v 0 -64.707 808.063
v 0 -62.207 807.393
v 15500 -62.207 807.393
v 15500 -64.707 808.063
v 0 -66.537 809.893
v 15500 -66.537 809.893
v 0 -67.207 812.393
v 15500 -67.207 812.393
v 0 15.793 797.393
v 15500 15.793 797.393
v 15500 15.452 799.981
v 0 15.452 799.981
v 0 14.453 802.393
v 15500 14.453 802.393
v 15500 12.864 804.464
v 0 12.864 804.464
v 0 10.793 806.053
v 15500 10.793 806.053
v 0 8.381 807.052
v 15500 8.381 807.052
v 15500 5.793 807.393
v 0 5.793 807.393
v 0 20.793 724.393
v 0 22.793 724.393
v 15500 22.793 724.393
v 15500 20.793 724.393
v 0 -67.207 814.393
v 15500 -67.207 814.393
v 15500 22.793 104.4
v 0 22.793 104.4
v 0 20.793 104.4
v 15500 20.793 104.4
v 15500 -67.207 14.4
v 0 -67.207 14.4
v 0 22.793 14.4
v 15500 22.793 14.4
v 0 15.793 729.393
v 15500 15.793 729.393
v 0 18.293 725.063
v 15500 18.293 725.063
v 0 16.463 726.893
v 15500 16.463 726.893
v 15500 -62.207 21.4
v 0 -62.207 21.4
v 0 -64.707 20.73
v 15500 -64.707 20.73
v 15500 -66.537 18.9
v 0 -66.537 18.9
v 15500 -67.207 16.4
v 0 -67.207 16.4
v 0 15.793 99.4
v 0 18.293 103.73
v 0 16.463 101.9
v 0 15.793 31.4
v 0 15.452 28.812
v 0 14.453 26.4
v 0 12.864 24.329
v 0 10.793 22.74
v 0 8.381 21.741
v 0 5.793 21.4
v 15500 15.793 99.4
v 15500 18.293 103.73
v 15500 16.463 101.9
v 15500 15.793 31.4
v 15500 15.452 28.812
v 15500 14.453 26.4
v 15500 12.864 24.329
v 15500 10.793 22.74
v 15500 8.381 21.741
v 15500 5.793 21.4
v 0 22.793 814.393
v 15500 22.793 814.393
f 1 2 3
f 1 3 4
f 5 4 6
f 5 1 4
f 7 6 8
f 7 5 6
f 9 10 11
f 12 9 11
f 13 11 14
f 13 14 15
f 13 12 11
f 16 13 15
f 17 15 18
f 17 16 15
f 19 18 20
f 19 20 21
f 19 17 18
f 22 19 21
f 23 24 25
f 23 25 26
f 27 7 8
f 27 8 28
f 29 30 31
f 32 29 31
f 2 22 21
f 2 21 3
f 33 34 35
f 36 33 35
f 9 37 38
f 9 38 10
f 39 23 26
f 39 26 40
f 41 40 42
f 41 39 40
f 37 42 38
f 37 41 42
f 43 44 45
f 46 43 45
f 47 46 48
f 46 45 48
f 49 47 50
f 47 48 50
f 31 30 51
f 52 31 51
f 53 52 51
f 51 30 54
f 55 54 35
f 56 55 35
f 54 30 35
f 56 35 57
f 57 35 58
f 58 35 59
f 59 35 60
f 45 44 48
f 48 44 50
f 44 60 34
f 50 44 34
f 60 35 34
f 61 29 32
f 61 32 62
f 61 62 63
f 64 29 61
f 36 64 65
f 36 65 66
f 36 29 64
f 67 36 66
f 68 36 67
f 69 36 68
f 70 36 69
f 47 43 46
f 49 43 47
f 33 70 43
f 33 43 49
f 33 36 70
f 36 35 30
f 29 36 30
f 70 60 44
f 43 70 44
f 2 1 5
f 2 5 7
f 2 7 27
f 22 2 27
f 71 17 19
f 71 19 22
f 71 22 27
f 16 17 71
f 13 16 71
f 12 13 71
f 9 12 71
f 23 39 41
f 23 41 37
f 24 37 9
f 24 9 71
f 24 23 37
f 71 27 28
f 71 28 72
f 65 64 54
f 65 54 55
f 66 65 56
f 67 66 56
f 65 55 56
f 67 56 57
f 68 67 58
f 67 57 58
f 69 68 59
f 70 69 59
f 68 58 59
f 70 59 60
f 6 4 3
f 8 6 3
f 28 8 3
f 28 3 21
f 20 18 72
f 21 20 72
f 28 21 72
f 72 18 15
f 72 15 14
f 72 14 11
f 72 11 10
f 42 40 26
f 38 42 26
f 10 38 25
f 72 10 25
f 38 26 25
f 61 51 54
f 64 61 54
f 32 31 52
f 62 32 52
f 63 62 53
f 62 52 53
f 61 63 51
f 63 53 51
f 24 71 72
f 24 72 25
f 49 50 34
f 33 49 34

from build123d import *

# Parameters (mm, degrees)
EXTRUDE017_DEPTH = 15500
EXTRUDE018_DEPTH = 15500


with BuildPart() as extrude017:
    # AngleSteel004 → Extrude017 (new body)
    with BuildSketch(Plane(origin=(0, 53.415282, 39.015282), x_dir=(0, 1, 0), z_dir=(-1, 0, 0))):
        with BuildLine():
            Line((-24.615282, 24.615282), (-24.615282, -65.384718))
            Line((-24.615282, -65.384718), (-22.615282, -65.384718))
            ThreePointArc((-22.615282, -65.384718), (-19.079748, -63.920252), (-17.615282, -60.384718))
            Line((-17.615282, -60.384718), (-17.615282, 7.615282))
            ThreePointArc((-17.615282, 7.615282), (-14.68635, 14.68635), (-7.615282, 17.615282))
            Line((-7.615282, 17.615282), (60.384718, 17.615282))
            ThreePointArc((60.384718, 17.615282), (63.920252, 19.079748), (65.384718, 22.615282))
            Line((65.384718, 22.615282), (65.384718, 24.615282))
            Line((65.384718, 24.615282), (-24.615282, 24.615282))
        make_face()
    extrude(amount=-EXTRUDE017_DEPTH)


with BuildPart() as fusion001:
    # Mirror → Extrude018 (new body)
    with BuildSketch(Plane(origin=(0, 53.415282, 789.777402), x_dir=(0, -1, 0), z_dir=(1, 0, 0))):
        with BuildLine():
            Line((24.615282, -24.615282), (24.615282, 65.384718))
            Line((24.615282, 65.384718), (22.615282, 65.384718))
            ThreePointArc((22.615282, 65.384718), (19.079748, 63.920252), (17.615282, 60.384718))
            Line((17.615282, 60.384718), (17.615282, -7.615282))
            ThreePointArc((17.615282, -7.615282), (14.68635, -14.68635), (7.615282, -17.615282))
            Line((7.615282, -17.615282), (-60.384718, -17.615282))
            ThreePointArc((-60.384718, -17.615282), (-63.920252, -19.079748), (-65.384718, -22.615282))
            Line((-65.384718, -22.615282), (-65.384718, -24.615282))
            Line((-65.384718, -24.615282), (24.615282, -24.615282))
        make_face()
    extrude(amount=EXTRUDE018_DEPTH)

    # Fusion001: union Extrude017
    add(extrude017.part)


with BuildPart() as fusion_mirrored:
    # Mirror001: instance of Fusion001
    add(fusion001.part.mirror(Plane(origin=(0, 28.796342, 514.396342), x_dir=(-1, 0, 0), z_dir=(0, -1, 0))))


with BuildPart() as fusion_mirrored_1:
    # Mirror001 placement: moved
    add(fusion_mirrored.part.moved(Location((0, -6, 0))))


solid = fusion_mirrored_1.part
